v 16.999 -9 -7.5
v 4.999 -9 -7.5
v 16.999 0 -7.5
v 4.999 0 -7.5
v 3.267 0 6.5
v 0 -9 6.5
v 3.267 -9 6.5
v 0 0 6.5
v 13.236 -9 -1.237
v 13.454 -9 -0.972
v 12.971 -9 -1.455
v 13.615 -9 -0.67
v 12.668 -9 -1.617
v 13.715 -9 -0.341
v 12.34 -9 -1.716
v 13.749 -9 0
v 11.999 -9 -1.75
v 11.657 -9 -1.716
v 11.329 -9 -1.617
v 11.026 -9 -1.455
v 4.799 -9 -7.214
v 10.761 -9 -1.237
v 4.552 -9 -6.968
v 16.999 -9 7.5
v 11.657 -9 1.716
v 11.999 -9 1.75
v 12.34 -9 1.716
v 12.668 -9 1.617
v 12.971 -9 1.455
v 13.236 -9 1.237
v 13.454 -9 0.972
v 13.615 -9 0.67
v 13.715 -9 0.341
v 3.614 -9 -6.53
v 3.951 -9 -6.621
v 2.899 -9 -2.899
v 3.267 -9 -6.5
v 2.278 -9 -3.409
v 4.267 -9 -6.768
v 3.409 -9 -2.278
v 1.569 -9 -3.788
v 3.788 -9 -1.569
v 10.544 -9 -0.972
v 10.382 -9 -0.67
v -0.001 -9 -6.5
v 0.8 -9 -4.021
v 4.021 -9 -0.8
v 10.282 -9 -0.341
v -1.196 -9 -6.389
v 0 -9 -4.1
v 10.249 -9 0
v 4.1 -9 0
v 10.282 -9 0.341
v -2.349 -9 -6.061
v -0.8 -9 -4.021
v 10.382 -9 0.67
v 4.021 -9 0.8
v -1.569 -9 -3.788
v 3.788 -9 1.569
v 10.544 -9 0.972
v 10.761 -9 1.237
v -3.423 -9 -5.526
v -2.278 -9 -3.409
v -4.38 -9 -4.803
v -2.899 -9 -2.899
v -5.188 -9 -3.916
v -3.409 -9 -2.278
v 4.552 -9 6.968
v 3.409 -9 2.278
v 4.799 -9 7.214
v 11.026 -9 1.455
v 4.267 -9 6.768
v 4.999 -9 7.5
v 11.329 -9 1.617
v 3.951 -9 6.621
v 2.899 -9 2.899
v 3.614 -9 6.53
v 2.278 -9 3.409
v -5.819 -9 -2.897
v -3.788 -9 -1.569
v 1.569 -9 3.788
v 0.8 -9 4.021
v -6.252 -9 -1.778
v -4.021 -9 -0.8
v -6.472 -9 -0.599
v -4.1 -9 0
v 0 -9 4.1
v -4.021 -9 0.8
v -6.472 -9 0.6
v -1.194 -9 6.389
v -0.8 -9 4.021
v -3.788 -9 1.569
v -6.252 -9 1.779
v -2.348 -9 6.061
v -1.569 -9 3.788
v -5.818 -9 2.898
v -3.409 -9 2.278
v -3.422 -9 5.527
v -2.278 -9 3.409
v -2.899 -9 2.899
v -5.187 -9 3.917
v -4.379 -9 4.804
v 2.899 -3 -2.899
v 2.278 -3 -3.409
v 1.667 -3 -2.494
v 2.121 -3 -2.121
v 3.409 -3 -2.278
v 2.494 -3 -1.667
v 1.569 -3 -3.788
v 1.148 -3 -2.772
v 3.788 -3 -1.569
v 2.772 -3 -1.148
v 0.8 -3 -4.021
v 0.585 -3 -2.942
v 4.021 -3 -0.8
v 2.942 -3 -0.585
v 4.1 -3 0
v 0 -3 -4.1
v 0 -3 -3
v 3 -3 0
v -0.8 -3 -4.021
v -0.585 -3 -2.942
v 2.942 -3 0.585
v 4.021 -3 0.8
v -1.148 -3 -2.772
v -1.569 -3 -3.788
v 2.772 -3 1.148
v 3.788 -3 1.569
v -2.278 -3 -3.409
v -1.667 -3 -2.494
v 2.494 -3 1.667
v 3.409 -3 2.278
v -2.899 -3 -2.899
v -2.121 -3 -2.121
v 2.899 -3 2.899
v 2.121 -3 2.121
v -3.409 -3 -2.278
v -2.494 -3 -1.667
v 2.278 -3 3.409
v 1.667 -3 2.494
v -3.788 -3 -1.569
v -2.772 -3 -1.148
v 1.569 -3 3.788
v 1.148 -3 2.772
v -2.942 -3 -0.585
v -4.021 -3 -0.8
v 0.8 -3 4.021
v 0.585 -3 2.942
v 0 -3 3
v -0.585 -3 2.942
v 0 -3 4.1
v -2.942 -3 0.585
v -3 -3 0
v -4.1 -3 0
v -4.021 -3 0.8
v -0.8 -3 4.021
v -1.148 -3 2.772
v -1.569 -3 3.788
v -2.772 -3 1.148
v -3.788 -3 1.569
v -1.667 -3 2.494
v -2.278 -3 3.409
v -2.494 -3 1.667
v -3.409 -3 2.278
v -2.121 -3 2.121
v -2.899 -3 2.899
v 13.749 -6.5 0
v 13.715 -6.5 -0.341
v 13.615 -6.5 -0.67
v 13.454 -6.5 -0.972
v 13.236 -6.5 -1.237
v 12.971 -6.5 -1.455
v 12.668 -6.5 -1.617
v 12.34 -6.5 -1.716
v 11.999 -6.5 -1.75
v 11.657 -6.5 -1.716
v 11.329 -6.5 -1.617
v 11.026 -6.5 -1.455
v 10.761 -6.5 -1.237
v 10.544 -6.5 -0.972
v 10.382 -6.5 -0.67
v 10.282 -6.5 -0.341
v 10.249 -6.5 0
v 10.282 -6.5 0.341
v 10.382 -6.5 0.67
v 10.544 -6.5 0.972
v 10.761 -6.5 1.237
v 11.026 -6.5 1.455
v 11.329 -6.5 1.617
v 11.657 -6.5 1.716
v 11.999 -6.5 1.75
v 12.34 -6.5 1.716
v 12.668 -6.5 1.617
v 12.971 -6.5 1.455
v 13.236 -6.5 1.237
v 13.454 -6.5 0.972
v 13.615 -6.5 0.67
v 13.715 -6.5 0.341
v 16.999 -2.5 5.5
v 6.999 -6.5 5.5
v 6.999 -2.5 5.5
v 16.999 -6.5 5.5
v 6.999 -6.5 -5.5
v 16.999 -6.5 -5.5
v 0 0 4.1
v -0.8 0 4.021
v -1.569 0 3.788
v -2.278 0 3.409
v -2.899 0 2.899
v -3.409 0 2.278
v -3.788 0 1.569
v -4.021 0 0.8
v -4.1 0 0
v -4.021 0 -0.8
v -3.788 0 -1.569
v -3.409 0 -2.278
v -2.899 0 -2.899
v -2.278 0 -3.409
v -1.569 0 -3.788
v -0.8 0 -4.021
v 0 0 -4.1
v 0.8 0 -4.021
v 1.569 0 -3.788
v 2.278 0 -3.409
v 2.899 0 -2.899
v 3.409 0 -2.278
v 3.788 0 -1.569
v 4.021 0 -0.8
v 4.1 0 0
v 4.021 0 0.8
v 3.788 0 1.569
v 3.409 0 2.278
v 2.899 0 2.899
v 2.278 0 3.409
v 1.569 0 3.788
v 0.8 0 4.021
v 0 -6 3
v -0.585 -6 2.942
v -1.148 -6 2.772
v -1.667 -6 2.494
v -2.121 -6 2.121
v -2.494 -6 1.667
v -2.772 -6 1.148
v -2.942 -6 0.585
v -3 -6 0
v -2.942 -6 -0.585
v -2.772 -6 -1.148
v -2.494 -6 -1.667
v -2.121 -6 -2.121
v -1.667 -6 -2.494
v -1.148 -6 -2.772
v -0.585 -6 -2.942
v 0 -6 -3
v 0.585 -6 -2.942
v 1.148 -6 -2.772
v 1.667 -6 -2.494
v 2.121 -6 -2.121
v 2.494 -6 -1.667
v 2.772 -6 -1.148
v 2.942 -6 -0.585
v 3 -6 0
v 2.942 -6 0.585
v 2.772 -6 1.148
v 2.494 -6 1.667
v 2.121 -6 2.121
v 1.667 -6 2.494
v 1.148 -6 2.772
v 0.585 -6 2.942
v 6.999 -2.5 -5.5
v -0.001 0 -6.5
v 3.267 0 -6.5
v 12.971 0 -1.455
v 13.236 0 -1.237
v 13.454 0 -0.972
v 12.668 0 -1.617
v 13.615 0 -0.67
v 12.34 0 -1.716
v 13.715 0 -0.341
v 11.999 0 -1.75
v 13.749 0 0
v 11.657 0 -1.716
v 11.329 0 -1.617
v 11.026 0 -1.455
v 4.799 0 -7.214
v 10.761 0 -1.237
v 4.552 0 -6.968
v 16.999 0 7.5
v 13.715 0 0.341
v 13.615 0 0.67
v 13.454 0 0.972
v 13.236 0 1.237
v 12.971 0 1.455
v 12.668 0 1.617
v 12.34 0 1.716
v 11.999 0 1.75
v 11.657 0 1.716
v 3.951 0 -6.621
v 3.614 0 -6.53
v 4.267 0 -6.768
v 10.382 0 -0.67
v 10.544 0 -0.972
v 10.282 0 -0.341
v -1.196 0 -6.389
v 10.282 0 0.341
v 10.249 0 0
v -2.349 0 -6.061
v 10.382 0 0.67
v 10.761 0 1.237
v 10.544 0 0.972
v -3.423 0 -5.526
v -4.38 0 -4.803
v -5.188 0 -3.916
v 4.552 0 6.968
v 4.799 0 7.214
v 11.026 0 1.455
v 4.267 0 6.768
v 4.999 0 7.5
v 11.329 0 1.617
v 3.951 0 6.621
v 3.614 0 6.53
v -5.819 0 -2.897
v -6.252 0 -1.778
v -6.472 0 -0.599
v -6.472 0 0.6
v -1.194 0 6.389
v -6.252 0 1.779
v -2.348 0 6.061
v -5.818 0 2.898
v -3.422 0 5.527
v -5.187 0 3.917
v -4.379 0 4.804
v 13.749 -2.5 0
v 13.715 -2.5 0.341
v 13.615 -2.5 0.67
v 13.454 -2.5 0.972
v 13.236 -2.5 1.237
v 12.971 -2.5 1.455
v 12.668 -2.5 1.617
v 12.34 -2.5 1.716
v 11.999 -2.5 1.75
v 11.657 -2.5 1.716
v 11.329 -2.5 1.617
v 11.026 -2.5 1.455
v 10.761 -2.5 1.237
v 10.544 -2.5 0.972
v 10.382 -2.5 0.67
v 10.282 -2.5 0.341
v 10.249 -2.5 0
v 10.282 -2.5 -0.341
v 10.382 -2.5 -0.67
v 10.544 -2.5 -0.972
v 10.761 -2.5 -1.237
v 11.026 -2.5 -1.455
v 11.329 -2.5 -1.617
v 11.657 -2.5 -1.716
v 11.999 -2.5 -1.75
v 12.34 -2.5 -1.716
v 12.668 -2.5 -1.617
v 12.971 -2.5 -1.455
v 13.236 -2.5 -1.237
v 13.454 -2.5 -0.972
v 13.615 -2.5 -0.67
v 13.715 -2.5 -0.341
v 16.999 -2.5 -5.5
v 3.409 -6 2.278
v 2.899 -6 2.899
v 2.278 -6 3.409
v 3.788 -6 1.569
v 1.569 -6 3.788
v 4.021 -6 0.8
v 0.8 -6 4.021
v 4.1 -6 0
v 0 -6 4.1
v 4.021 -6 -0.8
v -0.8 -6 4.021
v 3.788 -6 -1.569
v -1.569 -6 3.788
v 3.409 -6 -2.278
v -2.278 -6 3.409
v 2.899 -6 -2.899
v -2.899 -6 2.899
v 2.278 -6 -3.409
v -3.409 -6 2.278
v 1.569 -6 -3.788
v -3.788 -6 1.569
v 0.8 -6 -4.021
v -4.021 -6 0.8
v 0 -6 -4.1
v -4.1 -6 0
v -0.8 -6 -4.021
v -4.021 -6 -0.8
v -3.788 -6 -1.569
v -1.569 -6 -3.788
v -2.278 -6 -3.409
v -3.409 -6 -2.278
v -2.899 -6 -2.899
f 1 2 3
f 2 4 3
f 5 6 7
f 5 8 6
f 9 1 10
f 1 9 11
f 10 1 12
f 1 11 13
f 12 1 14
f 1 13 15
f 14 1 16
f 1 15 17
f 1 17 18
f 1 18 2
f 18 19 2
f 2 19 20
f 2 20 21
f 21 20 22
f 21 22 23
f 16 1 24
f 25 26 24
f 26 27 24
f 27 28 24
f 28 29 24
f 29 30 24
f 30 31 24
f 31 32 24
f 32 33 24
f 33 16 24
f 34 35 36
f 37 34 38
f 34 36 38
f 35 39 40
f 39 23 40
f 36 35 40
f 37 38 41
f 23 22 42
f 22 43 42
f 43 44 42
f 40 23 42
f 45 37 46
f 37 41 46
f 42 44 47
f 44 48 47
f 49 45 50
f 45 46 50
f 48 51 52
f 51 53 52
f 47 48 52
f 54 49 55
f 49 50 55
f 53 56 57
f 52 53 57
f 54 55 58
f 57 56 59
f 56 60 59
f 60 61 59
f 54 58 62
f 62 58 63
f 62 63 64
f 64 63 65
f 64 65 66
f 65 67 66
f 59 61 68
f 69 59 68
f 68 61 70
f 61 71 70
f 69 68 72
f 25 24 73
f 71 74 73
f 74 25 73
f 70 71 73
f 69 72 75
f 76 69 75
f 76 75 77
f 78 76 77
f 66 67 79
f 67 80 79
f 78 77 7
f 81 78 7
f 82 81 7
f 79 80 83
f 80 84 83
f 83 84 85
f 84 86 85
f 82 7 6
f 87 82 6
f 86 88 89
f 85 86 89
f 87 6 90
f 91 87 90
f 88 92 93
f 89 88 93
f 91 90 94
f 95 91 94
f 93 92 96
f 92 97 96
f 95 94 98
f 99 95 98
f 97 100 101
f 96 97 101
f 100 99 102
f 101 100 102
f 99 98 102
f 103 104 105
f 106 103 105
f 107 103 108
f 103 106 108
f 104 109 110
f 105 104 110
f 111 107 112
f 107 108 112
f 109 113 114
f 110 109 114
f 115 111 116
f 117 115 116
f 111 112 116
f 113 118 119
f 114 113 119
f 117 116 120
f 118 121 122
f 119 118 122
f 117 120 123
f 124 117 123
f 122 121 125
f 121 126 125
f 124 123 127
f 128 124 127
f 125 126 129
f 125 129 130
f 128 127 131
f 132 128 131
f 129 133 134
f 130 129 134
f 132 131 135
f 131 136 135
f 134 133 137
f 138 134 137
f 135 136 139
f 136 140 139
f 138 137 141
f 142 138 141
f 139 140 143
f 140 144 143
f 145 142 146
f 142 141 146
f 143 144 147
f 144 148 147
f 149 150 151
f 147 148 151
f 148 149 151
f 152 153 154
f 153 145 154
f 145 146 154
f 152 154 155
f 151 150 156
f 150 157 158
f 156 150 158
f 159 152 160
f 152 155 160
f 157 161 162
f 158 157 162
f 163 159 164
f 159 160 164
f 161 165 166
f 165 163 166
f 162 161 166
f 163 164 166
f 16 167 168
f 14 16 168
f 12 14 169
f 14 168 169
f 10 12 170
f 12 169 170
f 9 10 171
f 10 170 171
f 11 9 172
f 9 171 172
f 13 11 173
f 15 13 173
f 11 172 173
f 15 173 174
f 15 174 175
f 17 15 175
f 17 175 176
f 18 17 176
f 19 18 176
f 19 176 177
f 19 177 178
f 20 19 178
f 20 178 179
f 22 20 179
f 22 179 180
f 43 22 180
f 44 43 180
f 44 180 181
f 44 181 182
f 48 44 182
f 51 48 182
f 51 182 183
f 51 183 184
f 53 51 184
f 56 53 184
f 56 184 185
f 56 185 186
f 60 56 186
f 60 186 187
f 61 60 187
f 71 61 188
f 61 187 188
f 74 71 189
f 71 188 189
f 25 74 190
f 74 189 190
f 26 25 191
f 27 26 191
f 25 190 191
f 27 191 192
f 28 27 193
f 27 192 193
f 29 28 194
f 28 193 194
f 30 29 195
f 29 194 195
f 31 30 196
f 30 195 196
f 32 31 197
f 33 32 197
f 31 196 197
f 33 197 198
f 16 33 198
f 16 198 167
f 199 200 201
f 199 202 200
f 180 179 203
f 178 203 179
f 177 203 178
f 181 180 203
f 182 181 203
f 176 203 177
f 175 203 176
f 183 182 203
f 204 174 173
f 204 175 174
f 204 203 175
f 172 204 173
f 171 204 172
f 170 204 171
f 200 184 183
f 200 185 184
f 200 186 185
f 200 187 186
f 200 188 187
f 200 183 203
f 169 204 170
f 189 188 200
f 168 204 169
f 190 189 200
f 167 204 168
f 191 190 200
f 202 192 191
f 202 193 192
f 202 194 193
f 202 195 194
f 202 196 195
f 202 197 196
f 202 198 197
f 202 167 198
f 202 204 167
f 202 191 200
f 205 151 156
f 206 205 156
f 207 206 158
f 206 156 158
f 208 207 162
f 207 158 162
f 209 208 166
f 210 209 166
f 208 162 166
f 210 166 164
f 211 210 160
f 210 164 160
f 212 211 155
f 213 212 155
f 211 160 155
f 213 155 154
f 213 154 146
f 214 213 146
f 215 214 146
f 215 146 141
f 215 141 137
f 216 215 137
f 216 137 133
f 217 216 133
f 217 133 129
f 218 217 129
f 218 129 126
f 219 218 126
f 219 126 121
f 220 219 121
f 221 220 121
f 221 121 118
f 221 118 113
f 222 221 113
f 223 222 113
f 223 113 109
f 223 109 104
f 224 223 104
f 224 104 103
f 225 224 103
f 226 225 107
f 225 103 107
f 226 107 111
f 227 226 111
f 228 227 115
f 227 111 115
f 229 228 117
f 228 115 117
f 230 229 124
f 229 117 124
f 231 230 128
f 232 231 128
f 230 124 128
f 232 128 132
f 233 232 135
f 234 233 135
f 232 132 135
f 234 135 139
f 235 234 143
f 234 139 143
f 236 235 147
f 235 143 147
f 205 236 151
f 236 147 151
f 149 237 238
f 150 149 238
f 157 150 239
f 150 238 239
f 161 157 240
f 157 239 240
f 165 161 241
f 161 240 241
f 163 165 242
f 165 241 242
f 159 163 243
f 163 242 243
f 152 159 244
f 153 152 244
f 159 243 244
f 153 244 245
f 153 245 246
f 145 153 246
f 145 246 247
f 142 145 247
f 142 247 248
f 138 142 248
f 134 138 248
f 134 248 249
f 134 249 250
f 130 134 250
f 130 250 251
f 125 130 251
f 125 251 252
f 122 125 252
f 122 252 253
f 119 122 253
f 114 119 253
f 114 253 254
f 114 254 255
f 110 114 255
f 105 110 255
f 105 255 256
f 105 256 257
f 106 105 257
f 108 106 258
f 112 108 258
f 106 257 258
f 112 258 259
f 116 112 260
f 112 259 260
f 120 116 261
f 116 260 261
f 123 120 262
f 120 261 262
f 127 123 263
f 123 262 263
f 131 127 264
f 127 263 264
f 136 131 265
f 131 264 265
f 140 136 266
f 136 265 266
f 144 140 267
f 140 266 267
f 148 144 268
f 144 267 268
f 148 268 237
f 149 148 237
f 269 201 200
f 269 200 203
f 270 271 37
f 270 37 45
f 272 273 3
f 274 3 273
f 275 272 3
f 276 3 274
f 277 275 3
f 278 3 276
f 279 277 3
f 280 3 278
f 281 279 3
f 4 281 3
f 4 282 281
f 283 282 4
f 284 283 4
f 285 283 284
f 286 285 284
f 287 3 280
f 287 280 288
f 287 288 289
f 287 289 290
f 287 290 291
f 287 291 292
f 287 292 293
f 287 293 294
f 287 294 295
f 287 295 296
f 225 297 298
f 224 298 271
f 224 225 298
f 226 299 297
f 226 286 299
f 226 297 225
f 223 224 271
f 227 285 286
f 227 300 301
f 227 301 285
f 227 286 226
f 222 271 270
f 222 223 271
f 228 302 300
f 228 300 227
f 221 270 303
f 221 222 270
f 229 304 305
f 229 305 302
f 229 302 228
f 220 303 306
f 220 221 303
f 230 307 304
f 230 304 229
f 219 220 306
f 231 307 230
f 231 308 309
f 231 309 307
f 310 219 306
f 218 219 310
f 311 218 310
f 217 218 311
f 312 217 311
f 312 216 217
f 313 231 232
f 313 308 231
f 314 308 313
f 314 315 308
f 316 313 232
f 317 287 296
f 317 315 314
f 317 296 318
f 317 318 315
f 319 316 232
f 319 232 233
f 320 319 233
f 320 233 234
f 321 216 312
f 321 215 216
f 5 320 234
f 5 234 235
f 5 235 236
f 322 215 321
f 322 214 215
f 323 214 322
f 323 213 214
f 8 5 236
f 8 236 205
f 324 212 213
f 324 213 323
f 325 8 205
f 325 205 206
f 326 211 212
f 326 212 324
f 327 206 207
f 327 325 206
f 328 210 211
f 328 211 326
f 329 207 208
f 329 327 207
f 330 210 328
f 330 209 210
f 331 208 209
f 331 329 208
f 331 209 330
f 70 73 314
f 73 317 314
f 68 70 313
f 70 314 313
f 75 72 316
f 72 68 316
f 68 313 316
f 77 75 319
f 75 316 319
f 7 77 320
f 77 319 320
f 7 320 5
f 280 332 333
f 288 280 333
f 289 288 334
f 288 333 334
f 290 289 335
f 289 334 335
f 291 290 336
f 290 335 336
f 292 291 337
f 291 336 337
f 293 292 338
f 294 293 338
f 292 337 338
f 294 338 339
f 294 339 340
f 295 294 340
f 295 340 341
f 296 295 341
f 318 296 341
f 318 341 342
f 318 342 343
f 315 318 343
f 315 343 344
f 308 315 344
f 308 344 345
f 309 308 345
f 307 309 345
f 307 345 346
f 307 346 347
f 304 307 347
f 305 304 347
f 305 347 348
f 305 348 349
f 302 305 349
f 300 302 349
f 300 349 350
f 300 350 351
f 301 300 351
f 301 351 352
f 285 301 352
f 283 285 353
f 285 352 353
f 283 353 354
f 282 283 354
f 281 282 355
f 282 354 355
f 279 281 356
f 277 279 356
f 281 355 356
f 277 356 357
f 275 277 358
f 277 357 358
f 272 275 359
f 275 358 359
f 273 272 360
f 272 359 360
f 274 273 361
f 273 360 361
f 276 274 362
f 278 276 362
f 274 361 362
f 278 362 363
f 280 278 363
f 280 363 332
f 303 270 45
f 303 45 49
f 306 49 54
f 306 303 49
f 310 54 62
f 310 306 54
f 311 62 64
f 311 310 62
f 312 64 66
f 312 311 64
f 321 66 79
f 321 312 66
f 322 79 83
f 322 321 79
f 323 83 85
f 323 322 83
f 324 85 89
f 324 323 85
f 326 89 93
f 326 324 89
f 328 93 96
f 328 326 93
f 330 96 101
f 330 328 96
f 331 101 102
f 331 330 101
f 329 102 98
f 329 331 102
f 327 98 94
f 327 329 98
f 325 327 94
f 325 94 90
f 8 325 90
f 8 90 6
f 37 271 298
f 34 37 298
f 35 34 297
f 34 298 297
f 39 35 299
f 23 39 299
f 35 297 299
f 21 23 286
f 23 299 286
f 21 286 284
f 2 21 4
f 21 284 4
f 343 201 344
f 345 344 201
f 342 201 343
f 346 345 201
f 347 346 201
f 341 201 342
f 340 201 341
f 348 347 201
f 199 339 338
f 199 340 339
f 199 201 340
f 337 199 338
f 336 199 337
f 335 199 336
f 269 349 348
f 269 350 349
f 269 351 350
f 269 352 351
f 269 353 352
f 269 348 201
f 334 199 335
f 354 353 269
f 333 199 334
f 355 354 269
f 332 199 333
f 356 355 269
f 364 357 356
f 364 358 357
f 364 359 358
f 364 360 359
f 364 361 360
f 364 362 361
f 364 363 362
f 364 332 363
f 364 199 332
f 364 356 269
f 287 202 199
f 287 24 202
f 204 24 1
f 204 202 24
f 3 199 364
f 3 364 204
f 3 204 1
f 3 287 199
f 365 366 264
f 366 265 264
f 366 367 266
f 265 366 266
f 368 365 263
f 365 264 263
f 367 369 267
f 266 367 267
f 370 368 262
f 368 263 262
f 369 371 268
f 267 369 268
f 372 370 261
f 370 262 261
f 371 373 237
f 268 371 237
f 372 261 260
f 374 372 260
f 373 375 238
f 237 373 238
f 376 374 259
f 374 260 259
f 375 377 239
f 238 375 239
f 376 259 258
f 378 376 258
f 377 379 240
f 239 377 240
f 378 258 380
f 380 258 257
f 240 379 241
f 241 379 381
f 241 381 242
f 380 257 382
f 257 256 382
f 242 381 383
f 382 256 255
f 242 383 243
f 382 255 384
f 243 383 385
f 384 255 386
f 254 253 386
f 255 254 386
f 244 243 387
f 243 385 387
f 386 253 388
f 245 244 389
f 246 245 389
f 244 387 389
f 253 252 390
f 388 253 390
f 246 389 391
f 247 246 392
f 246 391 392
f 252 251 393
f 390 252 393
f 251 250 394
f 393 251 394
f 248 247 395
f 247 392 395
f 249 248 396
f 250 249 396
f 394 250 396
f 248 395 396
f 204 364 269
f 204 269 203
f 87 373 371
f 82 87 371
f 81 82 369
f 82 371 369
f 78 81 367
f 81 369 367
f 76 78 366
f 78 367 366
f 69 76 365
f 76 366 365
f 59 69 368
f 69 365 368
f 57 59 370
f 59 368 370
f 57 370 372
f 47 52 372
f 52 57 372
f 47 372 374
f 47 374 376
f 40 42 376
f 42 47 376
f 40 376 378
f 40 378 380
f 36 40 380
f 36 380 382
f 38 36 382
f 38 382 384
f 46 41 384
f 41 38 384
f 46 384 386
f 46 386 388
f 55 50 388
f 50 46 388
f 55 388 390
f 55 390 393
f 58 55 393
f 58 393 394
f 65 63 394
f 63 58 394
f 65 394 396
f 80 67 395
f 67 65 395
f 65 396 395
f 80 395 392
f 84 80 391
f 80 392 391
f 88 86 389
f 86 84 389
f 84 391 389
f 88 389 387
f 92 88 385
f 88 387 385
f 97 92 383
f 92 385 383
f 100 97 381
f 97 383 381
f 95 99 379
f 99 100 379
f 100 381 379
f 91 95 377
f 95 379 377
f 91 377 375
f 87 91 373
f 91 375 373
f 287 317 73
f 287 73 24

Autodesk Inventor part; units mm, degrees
ref_plane "YZ Plane" through (0, 0, 0) normal (1, 0, 0) x (0, 1, 0)
ref_plane "XZ Plane" through (0, 0, 0) normal (0, 1, 0) x (-1, 0, 0)
ref_plane "XY Plane" through (0, 0, 0) normal (0, 0, 1) x (1, 0, 0)
sketch "Sketch1" plane through (0, 0, 0) normal (0, 1, 0) x (-1, 0, 0)
  circle A0 centre (0, 0) radius 2
  circle A1 centre (0, 0) radius 4 construction
  circle A2 centre (0, 0) radius 6.5
  dimension "d0" = 4
  dimension "d1" = 8
  dimension "d2" = 13
extrude "Extrusion1" add sketch "Sketch1" against normal blind 9
ref_plane "Work Plane1" through (0, -4.5, 0) normal (0, 1, 0) x (1, 0, 0)
hole "Hole1" at (0, 0, 0) direction (0, -1, 0) diameter 6 end through all counterbore diameter 8.2 counterbore depth 3
mirror "Mirror1" about plane through (0, -4.5, 0) normal (0, 1, 0) of "Hole1"
sketch "Sketch2" plane through (0, -4.5, 0) normal (0, 1, 0) x (1, 0, 0)
  circle A0 centre (0, 0) radius 4.1 projected
  circle A1 centre (0, 0) radius 6.5 projected
  line L0 (0, -6.5) -> (16.9987, -6.5)
  line L1 (16.9987, -6.5) -> (16.9987, 6.5)
  line L2 (16.9987, 6.5) -> (-0.0013, 6.5)
  arc A2 (-0.0013, 6.5) -> (0, -6.5) centre (0, 0) ccw
  dimension "d14" = 17
extrude "Extrusion2" add sketch "Sketch2" against normal up to surface (9 mm away) from surface at 4.5 contours A1 L2 L1 L0
sketch "Sketch3" plane through (16.9987, -9, -6.5) normal (1, 0, 0) x (0, 0, -1)
  line L0 (-13, 0) -> (-13, 9) construction
  line L1 (-13, 4.5) -> (0, 4.5) construction
  line L2 (0, 0) -> (0, 9) construction
  line L3 (-6.5, 9) -> (-6.5, -1) construction
  line L4 (-12, 6.5) -> (-1, 6.5)
  line L5 (-1, 6.5) -> (-1, 2.5)
  line L6 (-1, 2.5) -> (-12, 2.5)
  line L7 (-12, 2.5) -> (-12, 6.5)
  dimension "d17" = 11
  dimension "d18" = 4
extrude "Extrusion3" cut sketch "Sketch3" against normal blind 10
sketch "Sketch4" plane through (0, -4.5, 0) normal (0, 1, 0) x (1, 0, 0)
  line L0 (16.9987, 6.5) -> (16.9987, -6.5) projected
  line L1 (16.9987, -6.5) -> (4.9987, -6.5)
  line L2 (4.9987, -6.5) -> (4.9987, -7.5)
  line L3 (4.9987, -7.5) -> (16.9987, -7.5)
  line L4 (16.9987, -7.5) -> (16.9987, -6.5)
  line L5 (0, 0) -> (21.5191, 0) construction
  line L6 (16.9987, 6.5) -> (4.9987, 6.5)
  line L7 (4.9987, 6.5) -> (4.9987, 7.5)
  line L8 (4.9987, 7.5) -> (16.9987, 7.5)
  line L9 (16.9987, 7.5) -> (16.9987, 6.5)
  dimension "d21" = 1
  dimension "d22" = 12
extrude "Extrusion4" add sketch "Sketch4" against normal up to surface (9 mm away) from surface at 4.5
fillet "Fillet1" radius 2 2 edges at (4.9987, -4.5, -6.5) (4.9987, -4.5, 6.5)
sketch "Sketch5" plane through (0, -4.5, 0) normal (0, 1, 0) x (1, 0, 0)
  line L0 (16.9987, -5.5) -> (6.9987, -5.5) construction
  line L1 (6.9987, -5.5) -> (6.9987, 5.5) construction
  line L2 (16.9987, 5.5) -> (6.9987, 5.5) construction
  line L3 (6.9987, 0) -> (20.6867, 0) construction
  line L4 (11.9987, -5.5) -> (11.9987, 4.4002) construction
  circle A0 centre (11.9987, 0) radius 1.75
  point P0 (0, 0)
  dimension "d26" = 3.5
extrude "Extrusion5" cut sketch "Sketch5" along normal through all both and the other way through all
properties part number "center-machine-v2-rod-socket"
